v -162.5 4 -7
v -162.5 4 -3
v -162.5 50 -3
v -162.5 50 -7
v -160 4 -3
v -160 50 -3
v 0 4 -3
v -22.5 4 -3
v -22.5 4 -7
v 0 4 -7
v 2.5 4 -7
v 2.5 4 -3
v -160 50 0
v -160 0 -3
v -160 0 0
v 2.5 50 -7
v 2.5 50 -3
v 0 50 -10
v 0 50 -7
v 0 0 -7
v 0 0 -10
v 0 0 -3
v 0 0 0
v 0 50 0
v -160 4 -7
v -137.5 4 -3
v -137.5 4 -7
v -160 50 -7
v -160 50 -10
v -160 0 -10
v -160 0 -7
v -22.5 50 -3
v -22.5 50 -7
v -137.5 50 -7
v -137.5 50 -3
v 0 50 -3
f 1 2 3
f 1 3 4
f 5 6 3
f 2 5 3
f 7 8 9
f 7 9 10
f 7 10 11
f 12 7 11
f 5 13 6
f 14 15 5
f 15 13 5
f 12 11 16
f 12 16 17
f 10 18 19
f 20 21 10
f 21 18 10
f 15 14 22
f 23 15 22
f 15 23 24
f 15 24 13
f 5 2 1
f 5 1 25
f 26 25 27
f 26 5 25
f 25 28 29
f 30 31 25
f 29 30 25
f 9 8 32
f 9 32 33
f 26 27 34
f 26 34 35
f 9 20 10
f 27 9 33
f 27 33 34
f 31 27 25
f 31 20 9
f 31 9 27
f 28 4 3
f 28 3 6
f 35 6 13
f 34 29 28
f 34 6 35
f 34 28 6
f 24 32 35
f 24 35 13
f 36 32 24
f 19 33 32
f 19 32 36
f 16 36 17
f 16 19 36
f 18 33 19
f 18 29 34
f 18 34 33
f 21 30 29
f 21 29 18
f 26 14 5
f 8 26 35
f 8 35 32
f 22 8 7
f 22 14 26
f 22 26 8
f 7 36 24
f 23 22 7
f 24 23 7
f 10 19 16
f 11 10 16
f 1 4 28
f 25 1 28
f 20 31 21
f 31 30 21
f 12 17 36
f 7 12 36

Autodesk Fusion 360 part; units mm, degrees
sketch "Esquisse1" plane through (0, 0, 0) normal (0, 1, 0) x (1, 0, 0)
  line L0 (0, 0) -> (-160, 0)
  line L1 (-160, 0) -> (-160, 3)
  line L2 (-160, 3) -> (0, 3)
  line L3 (0, 3) -> (0, 0)
  line L4 (0, 7) -> (-160, 7)
  line L5 (-160, 7) -> (-160, 10)
  line L6 (-160, 10) -> (0, 10)
  line L7 (0, 10) -> (0, 7)
  line L8 (-137.5, 3) -> (-162.5, 3)
  line L9 (-162.5, 3) -> (-162.5, 7)
  line L10 (-162.5, 7) -> (-137.5, 7)
  line L11 (-137.5, 7) -> (-137.5, 3)
  line L12 (-22.5, 7) -> (2.5, 7)
  line L13 (2.5, 7) -> (2.5, 3)
  line L14 (2.5, 3) -> (-22.5, 3)
  line L15 (-22.5, 3) -> (-22.5, 7)
  dimension "d1" = 160
  dimension "d2" = 3
  dimension "d3" = 160
  dimension "d4" = 3
  dimension "d5" = 4
  dimension "d6" = 25
  dimension "d7" = 2.5
  dimension "d8" = 4
  dimension "d9" = 4
  dimension "d10" = 25
  dimension "d11" = 2.5
extrude "Extrusion1" add sketch "Esquisse1" along normal blind 50 contours L0 L1 L2 L3 L8 L14 | L2 L4 L12 L13 L14 L15 | L2 L4 L8 L9 L10 L11 | L4 L5 L6 L7 L10 L12
sketch "Esquisse2" plane through (0, 0, 0) normal (0, -1, 0) x (1, 0, 0)
  line L0 (-22.5, -3) -> (-22.5, -7)
  line L1 (-22.5, -7) -> (-137.5, -7)
  line L2 (-137.5, -7) -> (-137.5, -3)
  line L3 (-137.5, -3) -> (-22.5, -3)
  line L4 (2.5, -7) -> (2.5, -3)
  line L5 (2.5, -3) -> (0, -3)
  line L6 (0, -3) -> (0, 0)
  line L7 (0, 0) -> (-160, 0)
  line L8 (-160, 0) -> (-160, -3)
  line L9 (-160, -3) -> (-162.5, -3)
  line L10 (-162.5, -3) -> (-162.5, -7)
  line L11 (-162.5, -7) -> (-160, -7)
  line L12 (-160, -7) -> (-160, -10)
  line L13 (-160, -10) -> (0, -10)
  line L14 (0, -10) -> (0, -7)
  line L15 (0, -7) -> (2.5, -7)
  line L16 (-22.5, -3) -> (2.5, -3)
  line L17 (2.5, -3) -> (2.5, -7)
  line L18 (2.5, -7) -> (-22.5, -7)
  line L19 (-22.5, -7) -> (-22.5, -3)
  line L20 (-137.5, -7) -> (-162.5, -7)
  line L21 (-162.5, -7) -> (-162.5, -3)
  line L22 (-162.5, -3) -> (-137.5, -3)
  line L23 (-137.5, -3) -> (-137.5, -7)
extrude "Extrusion2" cut sketch "Esquisse2" against normal blind 4 contours L0 L4 L5 L15 L16 L17 L18 L19 | L2 L9 L10 L11 L20 L21 L22 L23
